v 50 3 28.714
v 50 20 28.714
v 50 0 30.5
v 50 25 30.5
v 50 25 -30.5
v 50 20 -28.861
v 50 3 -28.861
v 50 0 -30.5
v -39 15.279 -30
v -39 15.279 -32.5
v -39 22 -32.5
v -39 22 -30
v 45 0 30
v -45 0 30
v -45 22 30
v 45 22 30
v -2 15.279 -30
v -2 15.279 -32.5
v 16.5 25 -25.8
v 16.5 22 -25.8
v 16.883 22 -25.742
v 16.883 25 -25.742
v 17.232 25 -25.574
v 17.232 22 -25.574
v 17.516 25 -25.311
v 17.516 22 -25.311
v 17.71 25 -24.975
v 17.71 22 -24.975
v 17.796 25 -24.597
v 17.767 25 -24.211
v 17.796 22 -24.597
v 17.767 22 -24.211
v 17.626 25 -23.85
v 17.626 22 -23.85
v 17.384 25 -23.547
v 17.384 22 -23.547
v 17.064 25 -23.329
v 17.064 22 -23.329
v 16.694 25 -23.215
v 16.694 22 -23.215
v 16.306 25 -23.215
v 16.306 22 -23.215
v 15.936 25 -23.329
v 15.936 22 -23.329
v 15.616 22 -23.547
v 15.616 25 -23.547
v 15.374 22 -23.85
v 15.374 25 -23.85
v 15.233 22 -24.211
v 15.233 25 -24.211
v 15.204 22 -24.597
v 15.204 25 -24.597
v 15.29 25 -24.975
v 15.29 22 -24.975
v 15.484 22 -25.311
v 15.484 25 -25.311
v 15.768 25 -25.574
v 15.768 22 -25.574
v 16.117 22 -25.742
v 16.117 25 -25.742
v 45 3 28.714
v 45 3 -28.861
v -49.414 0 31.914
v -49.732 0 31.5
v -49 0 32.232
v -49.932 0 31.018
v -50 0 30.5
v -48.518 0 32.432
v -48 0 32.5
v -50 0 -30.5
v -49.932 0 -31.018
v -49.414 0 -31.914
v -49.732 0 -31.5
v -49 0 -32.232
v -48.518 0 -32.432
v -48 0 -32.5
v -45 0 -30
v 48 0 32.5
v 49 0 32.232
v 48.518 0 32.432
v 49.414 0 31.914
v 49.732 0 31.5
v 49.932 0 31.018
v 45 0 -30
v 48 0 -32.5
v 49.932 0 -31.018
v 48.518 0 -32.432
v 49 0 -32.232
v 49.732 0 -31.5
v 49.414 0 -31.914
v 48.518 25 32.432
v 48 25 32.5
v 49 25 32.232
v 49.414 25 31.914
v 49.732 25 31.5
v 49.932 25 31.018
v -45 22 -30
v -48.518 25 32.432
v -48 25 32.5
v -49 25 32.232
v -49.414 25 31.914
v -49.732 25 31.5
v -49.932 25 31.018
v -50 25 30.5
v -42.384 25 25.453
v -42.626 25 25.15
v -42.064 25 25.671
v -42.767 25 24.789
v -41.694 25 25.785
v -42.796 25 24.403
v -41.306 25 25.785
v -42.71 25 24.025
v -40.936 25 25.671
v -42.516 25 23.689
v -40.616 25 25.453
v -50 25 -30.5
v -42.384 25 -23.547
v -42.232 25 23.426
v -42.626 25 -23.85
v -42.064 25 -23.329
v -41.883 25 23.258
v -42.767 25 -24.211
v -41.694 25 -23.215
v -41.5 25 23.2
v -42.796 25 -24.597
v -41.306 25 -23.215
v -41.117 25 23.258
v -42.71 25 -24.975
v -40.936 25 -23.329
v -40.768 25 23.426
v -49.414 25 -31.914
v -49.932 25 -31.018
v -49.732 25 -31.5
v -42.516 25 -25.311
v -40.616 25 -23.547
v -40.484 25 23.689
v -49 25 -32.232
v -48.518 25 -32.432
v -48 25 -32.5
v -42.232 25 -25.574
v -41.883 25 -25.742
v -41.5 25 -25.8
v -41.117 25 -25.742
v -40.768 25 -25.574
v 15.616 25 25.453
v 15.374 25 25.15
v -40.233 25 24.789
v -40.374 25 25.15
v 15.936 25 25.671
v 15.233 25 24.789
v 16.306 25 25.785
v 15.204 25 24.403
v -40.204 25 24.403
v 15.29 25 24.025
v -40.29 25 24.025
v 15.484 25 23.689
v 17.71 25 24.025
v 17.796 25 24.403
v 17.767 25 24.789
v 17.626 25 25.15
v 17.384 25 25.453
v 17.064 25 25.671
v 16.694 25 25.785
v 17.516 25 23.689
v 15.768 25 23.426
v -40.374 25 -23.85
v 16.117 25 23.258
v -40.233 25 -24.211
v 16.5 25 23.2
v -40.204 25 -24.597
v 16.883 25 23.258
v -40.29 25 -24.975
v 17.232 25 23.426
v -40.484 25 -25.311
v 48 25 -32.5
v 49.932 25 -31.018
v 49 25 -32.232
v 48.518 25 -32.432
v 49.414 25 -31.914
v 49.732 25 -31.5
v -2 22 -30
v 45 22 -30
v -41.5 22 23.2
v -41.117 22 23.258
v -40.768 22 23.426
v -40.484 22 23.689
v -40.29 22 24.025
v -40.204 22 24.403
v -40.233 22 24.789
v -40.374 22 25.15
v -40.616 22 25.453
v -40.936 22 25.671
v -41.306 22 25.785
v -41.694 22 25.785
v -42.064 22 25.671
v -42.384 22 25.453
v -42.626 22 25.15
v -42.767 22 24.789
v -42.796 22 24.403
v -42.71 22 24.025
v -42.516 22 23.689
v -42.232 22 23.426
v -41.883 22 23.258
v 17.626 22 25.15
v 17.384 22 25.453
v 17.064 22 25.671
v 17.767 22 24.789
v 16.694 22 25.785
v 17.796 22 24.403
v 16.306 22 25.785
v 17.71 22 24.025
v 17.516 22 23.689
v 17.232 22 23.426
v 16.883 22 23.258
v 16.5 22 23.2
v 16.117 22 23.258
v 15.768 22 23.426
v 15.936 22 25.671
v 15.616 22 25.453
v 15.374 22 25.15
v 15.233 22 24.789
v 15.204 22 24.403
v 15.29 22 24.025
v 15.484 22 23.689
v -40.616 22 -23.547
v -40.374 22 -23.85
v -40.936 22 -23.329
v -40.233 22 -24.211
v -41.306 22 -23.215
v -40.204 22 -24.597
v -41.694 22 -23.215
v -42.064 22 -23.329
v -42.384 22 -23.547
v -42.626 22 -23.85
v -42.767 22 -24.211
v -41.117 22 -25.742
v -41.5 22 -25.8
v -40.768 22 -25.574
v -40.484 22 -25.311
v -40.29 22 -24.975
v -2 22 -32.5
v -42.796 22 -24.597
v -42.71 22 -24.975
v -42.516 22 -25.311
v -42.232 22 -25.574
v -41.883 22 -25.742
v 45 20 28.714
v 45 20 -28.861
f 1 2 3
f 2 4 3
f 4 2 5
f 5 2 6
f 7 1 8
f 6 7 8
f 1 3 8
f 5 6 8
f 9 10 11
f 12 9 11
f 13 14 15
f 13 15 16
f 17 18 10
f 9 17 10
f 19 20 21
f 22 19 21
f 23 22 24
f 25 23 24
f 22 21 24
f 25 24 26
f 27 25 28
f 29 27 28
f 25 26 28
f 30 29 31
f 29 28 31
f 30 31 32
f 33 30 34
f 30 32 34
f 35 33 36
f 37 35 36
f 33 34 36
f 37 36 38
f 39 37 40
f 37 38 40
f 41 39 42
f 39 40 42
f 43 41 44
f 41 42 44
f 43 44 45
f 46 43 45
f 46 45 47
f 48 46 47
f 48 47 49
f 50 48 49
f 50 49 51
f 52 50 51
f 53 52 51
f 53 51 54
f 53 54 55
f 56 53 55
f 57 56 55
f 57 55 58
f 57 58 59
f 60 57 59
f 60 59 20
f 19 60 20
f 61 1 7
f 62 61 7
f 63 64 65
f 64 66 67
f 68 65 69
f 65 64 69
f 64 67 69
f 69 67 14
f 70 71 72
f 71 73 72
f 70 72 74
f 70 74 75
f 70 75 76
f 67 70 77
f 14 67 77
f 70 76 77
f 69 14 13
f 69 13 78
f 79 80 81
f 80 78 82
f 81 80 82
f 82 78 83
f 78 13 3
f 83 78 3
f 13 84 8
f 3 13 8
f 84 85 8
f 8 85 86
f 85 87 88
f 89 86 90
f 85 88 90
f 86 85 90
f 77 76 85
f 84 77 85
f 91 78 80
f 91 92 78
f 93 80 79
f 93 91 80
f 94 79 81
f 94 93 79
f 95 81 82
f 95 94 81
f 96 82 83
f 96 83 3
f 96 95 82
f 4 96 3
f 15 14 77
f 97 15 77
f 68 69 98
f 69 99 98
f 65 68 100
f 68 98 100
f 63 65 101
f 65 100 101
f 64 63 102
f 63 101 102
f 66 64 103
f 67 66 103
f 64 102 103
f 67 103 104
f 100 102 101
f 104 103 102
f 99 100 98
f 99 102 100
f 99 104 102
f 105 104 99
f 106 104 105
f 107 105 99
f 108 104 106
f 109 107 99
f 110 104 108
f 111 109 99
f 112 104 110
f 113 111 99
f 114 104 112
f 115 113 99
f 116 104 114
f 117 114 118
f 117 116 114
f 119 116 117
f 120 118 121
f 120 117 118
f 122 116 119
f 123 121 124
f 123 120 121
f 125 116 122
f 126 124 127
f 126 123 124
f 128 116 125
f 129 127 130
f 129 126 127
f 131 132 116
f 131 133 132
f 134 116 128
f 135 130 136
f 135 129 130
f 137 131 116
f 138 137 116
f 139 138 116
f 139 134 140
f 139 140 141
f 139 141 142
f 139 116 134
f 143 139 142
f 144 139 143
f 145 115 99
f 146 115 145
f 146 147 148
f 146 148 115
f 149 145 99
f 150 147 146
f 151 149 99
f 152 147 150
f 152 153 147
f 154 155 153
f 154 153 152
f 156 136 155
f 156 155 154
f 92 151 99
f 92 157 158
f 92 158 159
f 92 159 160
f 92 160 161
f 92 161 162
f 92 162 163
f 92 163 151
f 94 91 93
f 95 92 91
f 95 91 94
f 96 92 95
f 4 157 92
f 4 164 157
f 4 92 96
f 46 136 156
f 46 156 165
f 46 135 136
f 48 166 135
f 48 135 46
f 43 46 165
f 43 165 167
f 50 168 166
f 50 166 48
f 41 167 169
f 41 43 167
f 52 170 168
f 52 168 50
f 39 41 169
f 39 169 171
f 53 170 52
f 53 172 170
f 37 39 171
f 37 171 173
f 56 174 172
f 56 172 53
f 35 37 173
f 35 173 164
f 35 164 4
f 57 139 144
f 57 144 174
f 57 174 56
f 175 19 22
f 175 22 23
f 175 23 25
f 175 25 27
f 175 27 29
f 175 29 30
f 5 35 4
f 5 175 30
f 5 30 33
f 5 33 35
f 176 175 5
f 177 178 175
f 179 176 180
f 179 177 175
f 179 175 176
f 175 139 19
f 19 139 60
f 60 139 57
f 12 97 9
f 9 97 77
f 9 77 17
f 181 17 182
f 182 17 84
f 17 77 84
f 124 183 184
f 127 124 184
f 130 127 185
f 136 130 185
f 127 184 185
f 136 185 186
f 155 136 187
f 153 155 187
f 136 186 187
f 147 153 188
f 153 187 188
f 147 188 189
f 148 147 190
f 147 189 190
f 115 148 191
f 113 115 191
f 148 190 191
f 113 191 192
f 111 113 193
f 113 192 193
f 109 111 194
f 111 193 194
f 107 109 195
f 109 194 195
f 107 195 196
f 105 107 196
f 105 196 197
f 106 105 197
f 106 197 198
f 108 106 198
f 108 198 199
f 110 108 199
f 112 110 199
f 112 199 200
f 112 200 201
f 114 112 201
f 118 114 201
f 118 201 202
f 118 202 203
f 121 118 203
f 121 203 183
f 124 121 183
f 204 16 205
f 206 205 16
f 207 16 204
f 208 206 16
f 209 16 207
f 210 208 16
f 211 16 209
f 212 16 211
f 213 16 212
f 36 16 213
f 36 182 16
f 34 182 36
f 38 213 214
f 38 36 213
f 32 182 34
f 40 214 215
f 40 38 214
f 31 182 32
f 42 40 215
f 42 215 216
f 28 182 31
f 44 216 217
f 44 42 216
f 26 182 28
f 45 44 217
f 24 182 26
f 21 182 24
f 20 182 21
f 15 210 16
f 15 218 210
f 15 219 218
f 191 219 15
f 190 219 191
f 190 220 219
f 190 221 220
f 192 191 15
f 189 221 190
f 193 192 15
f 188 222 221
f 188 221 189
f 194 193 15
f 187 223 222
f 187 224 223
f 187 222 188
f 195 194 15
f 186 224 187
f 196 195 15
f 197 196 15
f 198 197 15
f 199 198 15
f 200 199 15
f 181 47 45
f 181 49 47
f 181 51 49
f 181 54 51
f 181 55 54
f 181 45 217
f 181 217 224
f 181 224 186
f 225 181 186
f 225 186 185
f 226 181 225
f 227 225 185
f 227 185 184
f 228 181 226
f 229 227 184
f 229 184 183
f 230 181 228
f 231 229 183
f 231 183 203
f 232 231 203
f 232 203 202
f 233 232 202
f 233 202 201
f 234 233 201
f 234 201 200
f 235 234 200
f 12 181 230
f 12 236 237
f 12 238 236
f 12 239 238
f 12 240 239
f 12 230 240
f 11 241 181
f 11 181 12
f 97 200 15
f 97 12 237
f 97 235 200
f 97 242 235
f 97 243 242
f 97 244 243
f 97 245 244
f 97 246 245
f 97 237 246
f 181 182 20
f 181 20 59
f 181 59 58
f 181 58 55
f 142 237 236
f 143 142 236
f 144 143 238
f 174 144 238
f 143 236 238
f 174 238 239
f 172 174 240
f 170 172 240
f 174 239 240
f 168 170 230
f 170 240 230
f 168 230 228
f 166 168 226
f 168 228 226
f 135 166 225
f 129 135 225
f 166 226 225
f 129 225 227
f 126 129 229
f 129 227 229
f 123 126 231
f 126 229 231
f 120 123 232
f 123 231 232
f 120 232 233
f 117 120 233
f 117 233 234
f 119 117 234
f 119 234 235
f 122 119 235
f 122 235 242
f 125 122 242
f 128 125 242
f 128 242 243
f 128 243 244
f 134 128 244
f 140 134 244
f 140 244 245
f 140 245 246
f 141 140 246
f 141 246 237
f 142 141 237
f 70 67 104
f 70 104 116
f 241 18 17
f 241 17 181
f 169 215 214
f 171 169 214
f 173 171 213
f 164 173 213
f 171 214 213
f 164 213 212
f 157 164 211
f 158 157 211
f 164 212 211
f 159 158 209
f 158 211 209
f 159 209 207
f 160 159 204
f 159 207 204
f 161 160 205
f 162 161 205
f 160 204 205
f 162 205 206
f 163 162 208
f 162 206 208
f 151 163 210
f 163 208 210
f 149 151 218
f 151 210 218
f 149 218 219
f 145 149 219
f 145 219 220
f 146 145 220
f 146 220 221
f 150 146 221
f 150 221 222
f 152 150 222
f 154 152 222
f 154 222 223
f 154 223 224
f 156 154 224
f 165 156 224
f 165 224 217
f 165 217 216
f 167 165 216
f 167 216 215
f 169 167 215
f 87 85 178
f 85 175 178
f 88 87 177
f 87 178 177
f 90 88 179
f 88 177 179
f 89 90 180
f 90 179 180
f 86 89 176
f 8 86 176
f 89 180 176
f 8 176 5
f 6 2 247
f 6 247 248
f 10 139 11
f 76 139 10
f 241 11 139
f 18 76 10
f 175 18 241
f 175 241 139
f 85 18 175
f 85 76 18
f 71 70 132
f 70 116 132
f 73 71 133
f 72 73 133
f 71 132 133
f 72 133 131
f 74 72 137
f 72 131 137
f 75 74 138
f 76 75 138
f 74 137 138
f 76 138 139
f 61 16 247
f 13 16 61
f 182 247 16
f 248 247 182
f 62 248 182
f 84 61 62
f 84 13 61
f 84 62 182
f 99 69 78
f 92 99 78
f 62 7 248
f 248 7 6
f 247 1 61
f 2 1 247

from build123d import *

# Parameters (mm, degrees)
SKETCH1_W           = 100
SKETCH1_H           = 65
BOSS_EXTRUDE2_DEPTH = 25
SKETCH1_5_W         = 90
SKETCH1_5_H         = 60
CUT_EXTRUDE1_DEPTH  = 22
SKETCH3_R           = 1.3
CUT_EXTRUDE2_DEPTH  = 18
FILLET2_R           = 2
FILLET3_R           = 2
FILLET4_R           = 2
FILLET5_R           = 2
SKETCH5_W           = 37
SKETCH5_H           = 6.720639237
CUT_EXTRUDE3_DEPTH  = 10
SKETCH6_W           = 57.574734681
SKETCH6_H           = 17
CUT_EXTRUDE4_DEPTH  = 10


with BuildPart() as part:
    # Sketch1 → Boss-Extrude2 (new body)
    with BuildSketch(Plane(origin=(0, 0, 0), x_dir=(1, 0, 0), z_dir=(0, 1, 0))):
        Rectangle(SKETCH1_W, SKETCH1_H)
    extrude(amount=BOSS_EXTRUDE2_DEPTH)

    # Sketch1<5> → Cut-Extrude1 (cut)
    with BuildSketch(Plane(origin=(0, 0, 0), x_dir=(1, 0, 0), z_dir=(0, 1, 0))):
        Rectangle(SKETCH1_5_W, SKETCH1_5_H)
    extrude(amount=CUT_EXTRUDE1_DEPTH, mode=Mode.SUBTRACT)

    # Sketch3 → Cut-Extrude2 (cut)
    with BuildSketch(Plane.XZ.offset(-22)):
        with Locations((-41.5, 24.5)):
            Circle(SKETCH3_R)
        with Locations((-41.5, -24.5)):
            Circle(SKETCH3_R)
        with Locations((16.5, -24.5)):
            Circle(SKETCH3_R)
        with Locations((16.5, 24.5)):
            Circle(SKETCH3_R)
    extrude(amount=-CUT_EXTRUDE2_DEPTH, mode=Mode.SUBTRACT)

    # Fillet2
    fillet2_edges = [part.edges().sort_by_distance(p)[0] for p in [
        (50, 12.5, 32.5),
    ]]
    fillet(fillet2_edges, radius=FILLET2_R)

    # Fillet3
    fillet3_edges = [part.edges().sort_by_distance(p)[0] for p in [
        (-50, 12.5, 32.5),
    ]]
    fillet(fillet3_edges, radius=FILLET3_R)

    # Fillet4
    fillet4_edges = [part.edges().sort_by_distance(p)[0] for p in [
        (-50, 12.5, -32.5),
    ]]
    fillet(fillet4_edges, radius=FILLET4_R)

    # Fillet5
    fillet5_edges = [part.edges().sort_by_distance(p)[0] for p in [
        (50, 12.5, -32.5),
    ]]
    fillet(fillet5_edges, radius=FILLET5_R)

    # Sketch5 → Cut-Extrude3 (cut)
    with BuildSketch(Plane(origin=(0, 0, -32.5), x_dir=(-1, 0, 0), z_dir=(0, 0, -1))):
        with Locations((20.5, 18.639680381)):
            Rectangle(SKETCH5_W, SKETCH5_H)
    extrude(amount=-CUT_EXTRUDE3_DEPTH, mode=Mode.SUBTRACT)

    # Sketch6 → Cut-Extrude4 (cut)
    with BuildSketch(Plane(origin=(50, 0, 0), x_dir=(0, 0, -1), z_dir=(1, 0, 0))):
        with Locations((0.07362498, 11.5)):
            Rectangle(SKETCH6_W, SKETCH6_H)
    extrude(amount=-CUT_EXTRUDE4_DEPTH, mode=Mode.SUBTRACT)


solid = part.part
